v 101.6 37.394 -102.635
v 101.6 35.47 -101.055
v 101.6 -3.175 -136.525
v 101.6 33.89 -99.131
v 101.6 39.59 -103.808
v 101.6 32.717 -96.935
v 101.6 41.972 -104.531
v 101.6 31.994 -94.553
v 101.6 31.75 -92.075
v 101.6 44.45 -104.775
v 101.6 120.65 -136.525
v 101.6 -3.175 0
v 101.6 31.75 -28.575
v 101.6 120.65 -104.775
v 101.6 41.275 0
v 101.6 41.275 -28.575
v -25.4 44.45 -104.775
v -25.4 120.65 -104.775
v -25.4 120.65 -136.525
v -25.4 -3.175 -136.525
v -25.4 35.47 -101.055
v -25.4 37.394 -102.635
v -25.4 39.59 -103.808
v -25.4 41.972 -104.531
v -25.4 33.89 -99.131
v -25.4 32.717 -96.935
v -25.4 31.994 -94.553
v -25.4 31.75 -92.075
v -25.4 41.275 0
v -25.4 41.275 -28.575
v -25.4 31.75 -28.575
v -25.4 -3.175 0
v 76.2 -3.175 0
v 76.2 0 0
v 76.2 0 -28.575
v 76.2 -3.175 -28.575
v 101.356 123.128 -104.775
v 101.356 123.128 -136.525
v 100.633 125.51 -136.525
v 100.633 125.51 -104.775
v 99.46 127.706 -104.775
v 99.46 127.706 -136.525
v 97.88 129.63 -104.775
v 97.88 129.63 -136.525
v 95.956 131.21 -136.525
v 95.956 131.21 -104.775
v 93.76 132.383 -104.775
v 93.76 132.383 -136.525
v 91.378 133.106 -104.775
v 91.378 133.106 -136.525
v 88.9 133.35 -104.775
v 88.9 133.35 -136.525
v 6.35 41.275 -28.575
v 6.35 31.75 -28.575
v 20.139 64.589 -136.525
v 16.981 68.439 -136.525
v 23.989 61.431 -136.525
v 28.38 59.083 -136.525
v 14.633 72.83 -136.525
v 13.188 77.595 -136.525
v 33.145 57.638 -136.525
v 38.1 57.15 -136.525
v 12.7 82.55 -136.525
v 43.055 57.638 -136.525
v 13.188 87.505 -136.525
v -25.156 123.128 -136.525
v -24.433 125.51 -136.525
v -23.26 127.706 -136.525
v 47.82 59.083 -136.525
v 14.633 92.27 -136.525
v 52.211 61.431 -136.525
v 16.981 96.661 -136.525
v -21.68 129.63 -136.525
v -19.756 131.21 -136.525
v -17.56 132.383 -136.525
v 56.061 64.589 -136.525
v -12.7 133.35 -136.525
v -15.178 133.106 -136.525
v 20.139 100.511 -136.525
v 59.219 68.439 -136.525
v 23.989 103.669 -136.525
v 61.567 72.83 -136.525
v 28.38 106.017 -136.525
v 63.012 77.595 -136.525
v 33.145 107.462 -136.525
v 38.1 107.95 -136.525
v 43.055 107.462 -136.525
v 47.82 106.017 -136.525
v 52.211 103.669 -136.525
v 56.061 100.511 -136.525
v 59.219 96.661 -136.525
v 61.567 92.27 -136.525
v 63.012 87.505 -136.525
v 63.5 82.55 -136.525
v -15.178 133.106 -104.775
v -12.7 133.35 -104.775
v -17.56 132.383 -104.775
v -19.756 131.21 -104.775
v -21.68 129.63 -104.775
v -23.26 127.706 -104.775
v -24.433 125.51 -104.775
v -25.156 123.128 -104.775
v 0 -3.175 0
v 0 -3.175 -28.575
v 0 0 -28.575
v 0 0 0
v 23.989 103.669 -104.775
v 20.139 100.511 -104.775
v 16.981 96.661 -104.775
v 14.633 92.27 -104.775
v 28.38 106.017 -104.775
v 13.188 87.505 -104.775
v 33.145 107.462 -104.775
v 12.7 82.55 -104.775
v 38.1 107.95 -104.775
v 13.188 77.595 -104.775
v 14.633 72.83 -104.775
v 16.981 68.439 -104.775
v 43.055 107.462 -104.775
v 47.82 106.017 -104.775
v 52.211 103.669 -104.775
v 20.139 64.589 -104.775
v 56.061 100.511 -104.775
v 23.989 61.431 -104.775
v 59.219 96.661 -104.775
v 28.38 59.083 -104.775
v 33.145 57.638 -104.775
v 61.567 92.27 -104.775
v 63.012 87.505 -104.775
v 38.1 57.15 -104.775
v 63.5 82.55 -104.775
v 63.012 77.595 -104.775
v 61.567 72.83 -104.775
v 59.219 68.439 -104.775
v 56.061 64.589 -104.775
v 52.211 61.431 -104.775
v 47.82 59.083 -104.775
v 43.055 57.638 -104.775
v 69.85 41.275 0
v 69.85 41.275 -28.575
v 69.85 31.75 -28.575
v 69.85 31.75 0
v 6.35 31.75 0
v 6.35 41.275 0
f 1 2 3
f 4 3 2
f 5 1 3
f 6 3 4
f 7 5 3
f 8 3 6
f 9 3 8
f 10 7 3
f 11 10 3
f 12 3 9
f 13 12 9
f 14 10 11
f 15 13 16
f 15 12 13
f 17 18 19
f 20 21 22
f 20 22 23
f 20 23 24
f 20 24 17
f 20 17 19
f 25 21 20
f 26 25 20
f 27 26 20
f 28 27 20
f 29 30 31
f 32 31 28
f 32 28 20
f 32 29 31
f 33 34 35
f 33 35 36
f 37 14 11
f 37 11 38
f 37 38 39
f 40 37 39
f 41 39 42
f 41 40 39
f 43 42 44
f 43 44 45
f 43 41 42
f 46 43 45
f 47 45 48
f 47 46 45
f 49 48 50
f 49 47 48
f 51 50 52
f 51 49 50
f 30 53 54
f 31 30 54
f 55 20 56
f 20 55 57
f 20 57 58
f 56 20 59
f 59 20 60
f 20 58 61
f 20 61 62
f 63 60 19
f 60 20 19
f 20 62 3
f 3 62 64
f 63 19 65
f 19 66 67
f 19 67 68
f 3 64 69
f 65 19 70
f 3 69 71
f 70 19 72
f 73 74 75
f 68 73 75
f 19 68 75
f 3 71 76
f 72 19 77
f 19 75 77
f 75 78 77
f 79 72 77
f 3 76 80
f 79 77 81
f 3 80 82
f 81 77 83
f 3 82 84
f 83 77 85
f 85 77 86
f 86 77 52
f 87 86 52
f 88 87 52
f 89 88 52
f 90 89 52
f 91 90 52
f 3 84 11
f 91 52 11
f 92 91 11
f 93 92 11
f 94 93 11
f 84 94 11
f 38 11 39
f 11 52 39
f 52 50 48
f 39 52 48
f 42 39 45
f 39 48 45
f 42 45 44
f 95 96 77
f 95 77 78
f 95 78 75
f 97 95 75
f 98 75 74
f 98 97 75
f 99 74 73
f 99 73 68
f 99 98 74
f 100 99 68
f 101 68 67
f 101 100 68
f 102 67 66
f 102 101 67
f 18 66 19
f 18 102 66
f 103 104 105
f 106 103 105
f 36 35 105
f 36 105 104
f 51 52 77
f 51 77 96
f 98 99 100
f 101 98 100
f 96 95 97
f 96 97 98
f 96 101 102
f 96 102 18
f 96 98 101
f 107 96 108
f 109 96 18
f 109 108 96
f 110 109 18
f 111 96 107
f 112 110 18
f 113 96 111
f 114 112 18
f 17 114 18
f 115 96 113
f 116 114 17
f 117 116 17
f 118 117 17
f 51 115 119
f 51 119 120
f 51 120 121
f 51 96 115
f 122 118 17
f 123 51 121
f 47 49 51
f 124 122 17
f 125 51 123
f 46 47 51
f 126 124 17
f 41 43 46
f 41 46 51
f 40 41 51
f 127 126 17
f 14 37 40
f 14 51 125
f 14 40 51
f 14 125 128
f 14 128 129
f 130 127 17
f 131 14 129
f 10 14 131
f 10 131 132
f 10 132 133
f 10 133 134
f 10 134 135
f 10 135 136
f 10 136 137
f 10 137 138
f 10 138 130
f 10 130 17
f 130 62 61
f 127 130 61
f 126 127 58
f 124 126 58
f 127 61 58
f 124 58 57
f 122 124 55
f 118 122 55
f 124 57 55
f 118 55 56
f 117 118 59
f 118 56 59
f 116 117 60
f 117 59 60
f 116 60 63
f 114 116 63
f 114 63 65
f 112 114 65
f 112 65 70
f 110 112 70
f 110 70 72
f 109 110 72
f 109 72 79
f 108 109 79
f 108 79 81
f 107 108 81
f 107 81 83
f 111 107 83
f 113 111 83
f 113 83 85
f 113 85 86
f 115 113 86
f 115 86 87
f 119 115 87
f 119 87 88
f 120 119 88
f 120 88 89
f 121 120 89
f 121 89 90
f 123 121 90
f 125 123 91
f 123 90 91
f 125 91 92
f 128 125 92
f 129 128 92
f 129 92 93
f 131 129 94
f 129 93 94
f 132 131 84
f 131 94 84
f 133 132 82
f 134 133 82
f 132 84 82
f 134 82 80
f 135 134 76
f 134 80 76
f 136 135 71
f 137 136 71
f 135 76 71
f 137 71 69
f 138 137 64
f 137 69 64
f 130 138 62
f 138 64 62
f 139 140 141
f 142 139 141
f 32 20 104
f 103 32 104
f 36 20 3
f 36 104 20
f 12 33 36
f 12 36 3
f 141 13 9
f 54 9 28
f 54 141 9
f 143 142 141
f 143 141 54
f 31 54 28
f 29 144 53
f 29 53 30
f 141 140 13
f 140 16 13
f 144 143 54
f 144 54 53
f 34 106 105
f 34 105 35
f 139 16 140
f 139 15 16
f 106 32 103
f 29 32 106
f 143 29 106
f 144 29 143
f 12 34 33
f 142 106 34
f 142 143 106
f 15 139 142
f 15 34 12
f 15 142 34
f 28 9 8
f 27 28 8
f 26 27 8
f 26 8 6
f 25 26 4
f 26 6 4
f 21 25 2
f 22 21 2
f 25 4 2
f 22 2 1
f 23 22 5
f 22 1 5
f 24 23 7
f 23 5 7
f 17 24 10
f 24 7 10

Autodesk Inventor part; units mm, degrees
ref_plane "YZ Plane" through (0, 0, 0) normal (1, 0, 0) x (0, 1, 0)
ref_plane "XZ Plane" through (0, 0, 0) normal (0, 1, 0) x (-1, 0, 0)
ref_plane "XY Plane" through (0, 0, 0) normal (0, 0, 1) x (1, 0, 0)
sketch "Sketch1" plane through (0, 0, 0) normal (0, 0, 1) x (1, 0, 0)
  line L0 (0, 0) -> (76.2, 0)
  line L1 (76.2, 0) -> (76.2, -3.175)
  line L2 (76.2, -3.175) -> (101.6, -3.175)
  line L3 (101.6, -3.175) -> (101.6, 41.275)
  line L4 (101.6, 41.275) -> (69.85, 41.275)
  line L5 (69.85, 41.275) -> (69.85, 31.75)
  line L6 (69.85, 31.75) -> (6.35, 31.75)
  line L7 (6.35, 31.75) -> (6.35, 41.275)
  line L8 (6.35, 41.275) -> (-25.4, 41.275)
  line L9 (-25.4, 41.275) -> (-25.4, -3.175)
  line L10 (-25.4, -3.175) -> (0, -3.175)
  line L11 (0, -3.175) -> (0, 0)
  dimension "d0" = 76.2
  dimension "d2" = 25.4
  dimension "d3" = 44.45
  dimension "d4" = 31.75
  dimension "d5" = 9.525
  dimension "d6" = 63.5
  dimension "d8" = 9.525
  dimension "d9" = 31.75
  dimension "d18" = 25.4
extrude "Extrusion3" add sketch "Sketch1" against normal blind 136.525
sketch "Sketch5" plane through (101.6, -3.175, 0) normal (1, 0, 0) x (0, 0, -1)
  line L0 (0, 44.45) -> (0, 0) projected
  line L1 (0, 44.45) -> (136.525, 44.45) projected
  line L2 (28.575, 44.45) -> (28.575, 34.925)
  line L3 (136.525, 0) -> (136.525, 44.45) projected
  line L4 (136.525, 44.45) -> (28.575, 44.45)
  line L5 (0, 34.925) -> (136.525, 34.925) projected
  line L6 (28.575, 34.925) -> (136.525, 34.925)
  line L7 (136.525, 34.925) -> (136.525, 44.45)
  point P0 (0, 3.175)
  dimension "d21" = 28.575
  dimension "d22" = 9.525
extrude "Extrusion4" cut sketch "Sketch5" against normal through all contours L1 L3 L5 L2
sketch "Sketch6" plane through (101.6, -3.175, 0) normal (1, 0, 0) x (0, 0, -1)
  line L0 (136.525, 0) -> (136.525, 136.525)
  line L1 (136.525, 136.525) -> (104.775, 136.525)
  line L2 (104.775, 136.525) -> (104.775, 0)
  line L3 (0, 0) -> (136.525, 0) projected
  point P0 (0, 3.175)
  dimension "d25" = 136.525
  dimension "d26" = 31.75
extrude "Extrusion5" add sketch "Sketch6" against normal blind 127
sketch "Sketch7" plane through (101.6, -3.175, 0) normal (1, 0, 0) x (0, 0, -1)
  line L0 (28.575, 34.925) -> (28.575, 44.45) projected
  line L1 (28.575, 44.45) -> (28.575, 34.925)
  line L2 (28.575, 34.925) -> (92.075, 34.925)
  line L3 (104.775, 136.525) -> (136.525, 136.525) projected
  line L4 (104.775, 47.625) -> (104.775, 136.525)
  line L5 (104.775, 136.525) -> (136.525, 136.525)
  line L6 (136.525, 136.525) -> (136.525, 0)
  line L7 (136.525, 0) -> (0, 0)
  line L8 (0, 0) -> (0, 44.45)
  line L9 (0, 44.45) -> (28.575, 44.45)
  arc A0 (92.075, 34.925) -> (104.775, 47.625) centre (92.075, 47.625) ccw
  line L10 (28.575, 34.925) -> (28.575, 0)
  line L11 (0, 0) -> (104.775, 0) projected
  point P0 (0, 3.175)
  point P1 (104.775, 34.925)
  point P2 (28.575, 0)
  dimension "d29" = 12.7
extrude "Extrusion6" add sketch "Sketch7" against normal blind 127 contours L2 A0 L4 L3 L6 L7 L10
sketch "Sketch8" plane through (-25.4, 133.35, -104.775) normal (0, 0, 1) x (1, 0, 0)
  line L0 (114.3, 0) -> (12.7, 0)
  line L1 (0, -12.7) -> (0, -88.9)
  line L2 (127, 0) -> (127, -136.525) projected
  arc A0 (127, -12.7) -> (114.3, 0) centre (114.3, -12.7) ccw
  arc A1 (12.7, 0) -> (0, -12.7) centre (12.7, -12.7) ccw
  line L3 (0, -88.9) -> (0, 0) projected
  line L4 (127, 0) -> (0, 0) projected
  line L5 (114.3, 0) -> (127, 0)
  line L6 (127, 0) -> (127, -12.7)
  point P0 (25.4, -133.35)
  point P1 (127, -12.7)
  dimension "d32" = 12.7
  dimension "d33" = 12.7
extrude "Extrusion7" cut sketch "Sketch8" against normal through all contours L4 L2 A0
sketch "Sketch9" plane through (-25.4, 44.45, -104.775) normal (0, 0, 1) x (1, 0, 0)
  line L0 (114.3, 88.9) -> (0, 88.9) projected
  line L1 (12.7, 88.9) -> (69.85, 88.9)
  line L2 (0, 76.2) -> (0, 46.0375)
  line L3 (0, 0) -> (0, 88.9) projected
  arc A0 (12.7, 88.9) -> (0, 76.2) centre (12.7, 76.2) ccw
  line L4 (0, 76.2) -> (0, 88.9)
  point P0 (25.4, -44.45)
  dimension "d36" = 12.7
extrude "Extrusion8" cut sketch "Sketch9" against normal through all
sketch "Sketch10" plane through (-25.4, 44.45, -104.775) normal (0, 0, 1) x (1, 0, 0)
  line L0 (127, 76.2) -> (127, 0) projected
  line L1 (114.3, 88.9) -> (12.7, 88.9) projected
  point P0 (25.4, -44.45)
  point P1 (63.5, 38.1)
  point P2 (63.5, 38.1)
  dimension "d39" = 63.5
  dimension "d40" = 50.8
hole "Hole1" at (38.1, 82.55, -104.775) at (38.1, 82.55, -104.775) direction (0, 0, -1) diameter 50.8 end through all
properties part number "Assignment 2.2 - Tube Mount"
